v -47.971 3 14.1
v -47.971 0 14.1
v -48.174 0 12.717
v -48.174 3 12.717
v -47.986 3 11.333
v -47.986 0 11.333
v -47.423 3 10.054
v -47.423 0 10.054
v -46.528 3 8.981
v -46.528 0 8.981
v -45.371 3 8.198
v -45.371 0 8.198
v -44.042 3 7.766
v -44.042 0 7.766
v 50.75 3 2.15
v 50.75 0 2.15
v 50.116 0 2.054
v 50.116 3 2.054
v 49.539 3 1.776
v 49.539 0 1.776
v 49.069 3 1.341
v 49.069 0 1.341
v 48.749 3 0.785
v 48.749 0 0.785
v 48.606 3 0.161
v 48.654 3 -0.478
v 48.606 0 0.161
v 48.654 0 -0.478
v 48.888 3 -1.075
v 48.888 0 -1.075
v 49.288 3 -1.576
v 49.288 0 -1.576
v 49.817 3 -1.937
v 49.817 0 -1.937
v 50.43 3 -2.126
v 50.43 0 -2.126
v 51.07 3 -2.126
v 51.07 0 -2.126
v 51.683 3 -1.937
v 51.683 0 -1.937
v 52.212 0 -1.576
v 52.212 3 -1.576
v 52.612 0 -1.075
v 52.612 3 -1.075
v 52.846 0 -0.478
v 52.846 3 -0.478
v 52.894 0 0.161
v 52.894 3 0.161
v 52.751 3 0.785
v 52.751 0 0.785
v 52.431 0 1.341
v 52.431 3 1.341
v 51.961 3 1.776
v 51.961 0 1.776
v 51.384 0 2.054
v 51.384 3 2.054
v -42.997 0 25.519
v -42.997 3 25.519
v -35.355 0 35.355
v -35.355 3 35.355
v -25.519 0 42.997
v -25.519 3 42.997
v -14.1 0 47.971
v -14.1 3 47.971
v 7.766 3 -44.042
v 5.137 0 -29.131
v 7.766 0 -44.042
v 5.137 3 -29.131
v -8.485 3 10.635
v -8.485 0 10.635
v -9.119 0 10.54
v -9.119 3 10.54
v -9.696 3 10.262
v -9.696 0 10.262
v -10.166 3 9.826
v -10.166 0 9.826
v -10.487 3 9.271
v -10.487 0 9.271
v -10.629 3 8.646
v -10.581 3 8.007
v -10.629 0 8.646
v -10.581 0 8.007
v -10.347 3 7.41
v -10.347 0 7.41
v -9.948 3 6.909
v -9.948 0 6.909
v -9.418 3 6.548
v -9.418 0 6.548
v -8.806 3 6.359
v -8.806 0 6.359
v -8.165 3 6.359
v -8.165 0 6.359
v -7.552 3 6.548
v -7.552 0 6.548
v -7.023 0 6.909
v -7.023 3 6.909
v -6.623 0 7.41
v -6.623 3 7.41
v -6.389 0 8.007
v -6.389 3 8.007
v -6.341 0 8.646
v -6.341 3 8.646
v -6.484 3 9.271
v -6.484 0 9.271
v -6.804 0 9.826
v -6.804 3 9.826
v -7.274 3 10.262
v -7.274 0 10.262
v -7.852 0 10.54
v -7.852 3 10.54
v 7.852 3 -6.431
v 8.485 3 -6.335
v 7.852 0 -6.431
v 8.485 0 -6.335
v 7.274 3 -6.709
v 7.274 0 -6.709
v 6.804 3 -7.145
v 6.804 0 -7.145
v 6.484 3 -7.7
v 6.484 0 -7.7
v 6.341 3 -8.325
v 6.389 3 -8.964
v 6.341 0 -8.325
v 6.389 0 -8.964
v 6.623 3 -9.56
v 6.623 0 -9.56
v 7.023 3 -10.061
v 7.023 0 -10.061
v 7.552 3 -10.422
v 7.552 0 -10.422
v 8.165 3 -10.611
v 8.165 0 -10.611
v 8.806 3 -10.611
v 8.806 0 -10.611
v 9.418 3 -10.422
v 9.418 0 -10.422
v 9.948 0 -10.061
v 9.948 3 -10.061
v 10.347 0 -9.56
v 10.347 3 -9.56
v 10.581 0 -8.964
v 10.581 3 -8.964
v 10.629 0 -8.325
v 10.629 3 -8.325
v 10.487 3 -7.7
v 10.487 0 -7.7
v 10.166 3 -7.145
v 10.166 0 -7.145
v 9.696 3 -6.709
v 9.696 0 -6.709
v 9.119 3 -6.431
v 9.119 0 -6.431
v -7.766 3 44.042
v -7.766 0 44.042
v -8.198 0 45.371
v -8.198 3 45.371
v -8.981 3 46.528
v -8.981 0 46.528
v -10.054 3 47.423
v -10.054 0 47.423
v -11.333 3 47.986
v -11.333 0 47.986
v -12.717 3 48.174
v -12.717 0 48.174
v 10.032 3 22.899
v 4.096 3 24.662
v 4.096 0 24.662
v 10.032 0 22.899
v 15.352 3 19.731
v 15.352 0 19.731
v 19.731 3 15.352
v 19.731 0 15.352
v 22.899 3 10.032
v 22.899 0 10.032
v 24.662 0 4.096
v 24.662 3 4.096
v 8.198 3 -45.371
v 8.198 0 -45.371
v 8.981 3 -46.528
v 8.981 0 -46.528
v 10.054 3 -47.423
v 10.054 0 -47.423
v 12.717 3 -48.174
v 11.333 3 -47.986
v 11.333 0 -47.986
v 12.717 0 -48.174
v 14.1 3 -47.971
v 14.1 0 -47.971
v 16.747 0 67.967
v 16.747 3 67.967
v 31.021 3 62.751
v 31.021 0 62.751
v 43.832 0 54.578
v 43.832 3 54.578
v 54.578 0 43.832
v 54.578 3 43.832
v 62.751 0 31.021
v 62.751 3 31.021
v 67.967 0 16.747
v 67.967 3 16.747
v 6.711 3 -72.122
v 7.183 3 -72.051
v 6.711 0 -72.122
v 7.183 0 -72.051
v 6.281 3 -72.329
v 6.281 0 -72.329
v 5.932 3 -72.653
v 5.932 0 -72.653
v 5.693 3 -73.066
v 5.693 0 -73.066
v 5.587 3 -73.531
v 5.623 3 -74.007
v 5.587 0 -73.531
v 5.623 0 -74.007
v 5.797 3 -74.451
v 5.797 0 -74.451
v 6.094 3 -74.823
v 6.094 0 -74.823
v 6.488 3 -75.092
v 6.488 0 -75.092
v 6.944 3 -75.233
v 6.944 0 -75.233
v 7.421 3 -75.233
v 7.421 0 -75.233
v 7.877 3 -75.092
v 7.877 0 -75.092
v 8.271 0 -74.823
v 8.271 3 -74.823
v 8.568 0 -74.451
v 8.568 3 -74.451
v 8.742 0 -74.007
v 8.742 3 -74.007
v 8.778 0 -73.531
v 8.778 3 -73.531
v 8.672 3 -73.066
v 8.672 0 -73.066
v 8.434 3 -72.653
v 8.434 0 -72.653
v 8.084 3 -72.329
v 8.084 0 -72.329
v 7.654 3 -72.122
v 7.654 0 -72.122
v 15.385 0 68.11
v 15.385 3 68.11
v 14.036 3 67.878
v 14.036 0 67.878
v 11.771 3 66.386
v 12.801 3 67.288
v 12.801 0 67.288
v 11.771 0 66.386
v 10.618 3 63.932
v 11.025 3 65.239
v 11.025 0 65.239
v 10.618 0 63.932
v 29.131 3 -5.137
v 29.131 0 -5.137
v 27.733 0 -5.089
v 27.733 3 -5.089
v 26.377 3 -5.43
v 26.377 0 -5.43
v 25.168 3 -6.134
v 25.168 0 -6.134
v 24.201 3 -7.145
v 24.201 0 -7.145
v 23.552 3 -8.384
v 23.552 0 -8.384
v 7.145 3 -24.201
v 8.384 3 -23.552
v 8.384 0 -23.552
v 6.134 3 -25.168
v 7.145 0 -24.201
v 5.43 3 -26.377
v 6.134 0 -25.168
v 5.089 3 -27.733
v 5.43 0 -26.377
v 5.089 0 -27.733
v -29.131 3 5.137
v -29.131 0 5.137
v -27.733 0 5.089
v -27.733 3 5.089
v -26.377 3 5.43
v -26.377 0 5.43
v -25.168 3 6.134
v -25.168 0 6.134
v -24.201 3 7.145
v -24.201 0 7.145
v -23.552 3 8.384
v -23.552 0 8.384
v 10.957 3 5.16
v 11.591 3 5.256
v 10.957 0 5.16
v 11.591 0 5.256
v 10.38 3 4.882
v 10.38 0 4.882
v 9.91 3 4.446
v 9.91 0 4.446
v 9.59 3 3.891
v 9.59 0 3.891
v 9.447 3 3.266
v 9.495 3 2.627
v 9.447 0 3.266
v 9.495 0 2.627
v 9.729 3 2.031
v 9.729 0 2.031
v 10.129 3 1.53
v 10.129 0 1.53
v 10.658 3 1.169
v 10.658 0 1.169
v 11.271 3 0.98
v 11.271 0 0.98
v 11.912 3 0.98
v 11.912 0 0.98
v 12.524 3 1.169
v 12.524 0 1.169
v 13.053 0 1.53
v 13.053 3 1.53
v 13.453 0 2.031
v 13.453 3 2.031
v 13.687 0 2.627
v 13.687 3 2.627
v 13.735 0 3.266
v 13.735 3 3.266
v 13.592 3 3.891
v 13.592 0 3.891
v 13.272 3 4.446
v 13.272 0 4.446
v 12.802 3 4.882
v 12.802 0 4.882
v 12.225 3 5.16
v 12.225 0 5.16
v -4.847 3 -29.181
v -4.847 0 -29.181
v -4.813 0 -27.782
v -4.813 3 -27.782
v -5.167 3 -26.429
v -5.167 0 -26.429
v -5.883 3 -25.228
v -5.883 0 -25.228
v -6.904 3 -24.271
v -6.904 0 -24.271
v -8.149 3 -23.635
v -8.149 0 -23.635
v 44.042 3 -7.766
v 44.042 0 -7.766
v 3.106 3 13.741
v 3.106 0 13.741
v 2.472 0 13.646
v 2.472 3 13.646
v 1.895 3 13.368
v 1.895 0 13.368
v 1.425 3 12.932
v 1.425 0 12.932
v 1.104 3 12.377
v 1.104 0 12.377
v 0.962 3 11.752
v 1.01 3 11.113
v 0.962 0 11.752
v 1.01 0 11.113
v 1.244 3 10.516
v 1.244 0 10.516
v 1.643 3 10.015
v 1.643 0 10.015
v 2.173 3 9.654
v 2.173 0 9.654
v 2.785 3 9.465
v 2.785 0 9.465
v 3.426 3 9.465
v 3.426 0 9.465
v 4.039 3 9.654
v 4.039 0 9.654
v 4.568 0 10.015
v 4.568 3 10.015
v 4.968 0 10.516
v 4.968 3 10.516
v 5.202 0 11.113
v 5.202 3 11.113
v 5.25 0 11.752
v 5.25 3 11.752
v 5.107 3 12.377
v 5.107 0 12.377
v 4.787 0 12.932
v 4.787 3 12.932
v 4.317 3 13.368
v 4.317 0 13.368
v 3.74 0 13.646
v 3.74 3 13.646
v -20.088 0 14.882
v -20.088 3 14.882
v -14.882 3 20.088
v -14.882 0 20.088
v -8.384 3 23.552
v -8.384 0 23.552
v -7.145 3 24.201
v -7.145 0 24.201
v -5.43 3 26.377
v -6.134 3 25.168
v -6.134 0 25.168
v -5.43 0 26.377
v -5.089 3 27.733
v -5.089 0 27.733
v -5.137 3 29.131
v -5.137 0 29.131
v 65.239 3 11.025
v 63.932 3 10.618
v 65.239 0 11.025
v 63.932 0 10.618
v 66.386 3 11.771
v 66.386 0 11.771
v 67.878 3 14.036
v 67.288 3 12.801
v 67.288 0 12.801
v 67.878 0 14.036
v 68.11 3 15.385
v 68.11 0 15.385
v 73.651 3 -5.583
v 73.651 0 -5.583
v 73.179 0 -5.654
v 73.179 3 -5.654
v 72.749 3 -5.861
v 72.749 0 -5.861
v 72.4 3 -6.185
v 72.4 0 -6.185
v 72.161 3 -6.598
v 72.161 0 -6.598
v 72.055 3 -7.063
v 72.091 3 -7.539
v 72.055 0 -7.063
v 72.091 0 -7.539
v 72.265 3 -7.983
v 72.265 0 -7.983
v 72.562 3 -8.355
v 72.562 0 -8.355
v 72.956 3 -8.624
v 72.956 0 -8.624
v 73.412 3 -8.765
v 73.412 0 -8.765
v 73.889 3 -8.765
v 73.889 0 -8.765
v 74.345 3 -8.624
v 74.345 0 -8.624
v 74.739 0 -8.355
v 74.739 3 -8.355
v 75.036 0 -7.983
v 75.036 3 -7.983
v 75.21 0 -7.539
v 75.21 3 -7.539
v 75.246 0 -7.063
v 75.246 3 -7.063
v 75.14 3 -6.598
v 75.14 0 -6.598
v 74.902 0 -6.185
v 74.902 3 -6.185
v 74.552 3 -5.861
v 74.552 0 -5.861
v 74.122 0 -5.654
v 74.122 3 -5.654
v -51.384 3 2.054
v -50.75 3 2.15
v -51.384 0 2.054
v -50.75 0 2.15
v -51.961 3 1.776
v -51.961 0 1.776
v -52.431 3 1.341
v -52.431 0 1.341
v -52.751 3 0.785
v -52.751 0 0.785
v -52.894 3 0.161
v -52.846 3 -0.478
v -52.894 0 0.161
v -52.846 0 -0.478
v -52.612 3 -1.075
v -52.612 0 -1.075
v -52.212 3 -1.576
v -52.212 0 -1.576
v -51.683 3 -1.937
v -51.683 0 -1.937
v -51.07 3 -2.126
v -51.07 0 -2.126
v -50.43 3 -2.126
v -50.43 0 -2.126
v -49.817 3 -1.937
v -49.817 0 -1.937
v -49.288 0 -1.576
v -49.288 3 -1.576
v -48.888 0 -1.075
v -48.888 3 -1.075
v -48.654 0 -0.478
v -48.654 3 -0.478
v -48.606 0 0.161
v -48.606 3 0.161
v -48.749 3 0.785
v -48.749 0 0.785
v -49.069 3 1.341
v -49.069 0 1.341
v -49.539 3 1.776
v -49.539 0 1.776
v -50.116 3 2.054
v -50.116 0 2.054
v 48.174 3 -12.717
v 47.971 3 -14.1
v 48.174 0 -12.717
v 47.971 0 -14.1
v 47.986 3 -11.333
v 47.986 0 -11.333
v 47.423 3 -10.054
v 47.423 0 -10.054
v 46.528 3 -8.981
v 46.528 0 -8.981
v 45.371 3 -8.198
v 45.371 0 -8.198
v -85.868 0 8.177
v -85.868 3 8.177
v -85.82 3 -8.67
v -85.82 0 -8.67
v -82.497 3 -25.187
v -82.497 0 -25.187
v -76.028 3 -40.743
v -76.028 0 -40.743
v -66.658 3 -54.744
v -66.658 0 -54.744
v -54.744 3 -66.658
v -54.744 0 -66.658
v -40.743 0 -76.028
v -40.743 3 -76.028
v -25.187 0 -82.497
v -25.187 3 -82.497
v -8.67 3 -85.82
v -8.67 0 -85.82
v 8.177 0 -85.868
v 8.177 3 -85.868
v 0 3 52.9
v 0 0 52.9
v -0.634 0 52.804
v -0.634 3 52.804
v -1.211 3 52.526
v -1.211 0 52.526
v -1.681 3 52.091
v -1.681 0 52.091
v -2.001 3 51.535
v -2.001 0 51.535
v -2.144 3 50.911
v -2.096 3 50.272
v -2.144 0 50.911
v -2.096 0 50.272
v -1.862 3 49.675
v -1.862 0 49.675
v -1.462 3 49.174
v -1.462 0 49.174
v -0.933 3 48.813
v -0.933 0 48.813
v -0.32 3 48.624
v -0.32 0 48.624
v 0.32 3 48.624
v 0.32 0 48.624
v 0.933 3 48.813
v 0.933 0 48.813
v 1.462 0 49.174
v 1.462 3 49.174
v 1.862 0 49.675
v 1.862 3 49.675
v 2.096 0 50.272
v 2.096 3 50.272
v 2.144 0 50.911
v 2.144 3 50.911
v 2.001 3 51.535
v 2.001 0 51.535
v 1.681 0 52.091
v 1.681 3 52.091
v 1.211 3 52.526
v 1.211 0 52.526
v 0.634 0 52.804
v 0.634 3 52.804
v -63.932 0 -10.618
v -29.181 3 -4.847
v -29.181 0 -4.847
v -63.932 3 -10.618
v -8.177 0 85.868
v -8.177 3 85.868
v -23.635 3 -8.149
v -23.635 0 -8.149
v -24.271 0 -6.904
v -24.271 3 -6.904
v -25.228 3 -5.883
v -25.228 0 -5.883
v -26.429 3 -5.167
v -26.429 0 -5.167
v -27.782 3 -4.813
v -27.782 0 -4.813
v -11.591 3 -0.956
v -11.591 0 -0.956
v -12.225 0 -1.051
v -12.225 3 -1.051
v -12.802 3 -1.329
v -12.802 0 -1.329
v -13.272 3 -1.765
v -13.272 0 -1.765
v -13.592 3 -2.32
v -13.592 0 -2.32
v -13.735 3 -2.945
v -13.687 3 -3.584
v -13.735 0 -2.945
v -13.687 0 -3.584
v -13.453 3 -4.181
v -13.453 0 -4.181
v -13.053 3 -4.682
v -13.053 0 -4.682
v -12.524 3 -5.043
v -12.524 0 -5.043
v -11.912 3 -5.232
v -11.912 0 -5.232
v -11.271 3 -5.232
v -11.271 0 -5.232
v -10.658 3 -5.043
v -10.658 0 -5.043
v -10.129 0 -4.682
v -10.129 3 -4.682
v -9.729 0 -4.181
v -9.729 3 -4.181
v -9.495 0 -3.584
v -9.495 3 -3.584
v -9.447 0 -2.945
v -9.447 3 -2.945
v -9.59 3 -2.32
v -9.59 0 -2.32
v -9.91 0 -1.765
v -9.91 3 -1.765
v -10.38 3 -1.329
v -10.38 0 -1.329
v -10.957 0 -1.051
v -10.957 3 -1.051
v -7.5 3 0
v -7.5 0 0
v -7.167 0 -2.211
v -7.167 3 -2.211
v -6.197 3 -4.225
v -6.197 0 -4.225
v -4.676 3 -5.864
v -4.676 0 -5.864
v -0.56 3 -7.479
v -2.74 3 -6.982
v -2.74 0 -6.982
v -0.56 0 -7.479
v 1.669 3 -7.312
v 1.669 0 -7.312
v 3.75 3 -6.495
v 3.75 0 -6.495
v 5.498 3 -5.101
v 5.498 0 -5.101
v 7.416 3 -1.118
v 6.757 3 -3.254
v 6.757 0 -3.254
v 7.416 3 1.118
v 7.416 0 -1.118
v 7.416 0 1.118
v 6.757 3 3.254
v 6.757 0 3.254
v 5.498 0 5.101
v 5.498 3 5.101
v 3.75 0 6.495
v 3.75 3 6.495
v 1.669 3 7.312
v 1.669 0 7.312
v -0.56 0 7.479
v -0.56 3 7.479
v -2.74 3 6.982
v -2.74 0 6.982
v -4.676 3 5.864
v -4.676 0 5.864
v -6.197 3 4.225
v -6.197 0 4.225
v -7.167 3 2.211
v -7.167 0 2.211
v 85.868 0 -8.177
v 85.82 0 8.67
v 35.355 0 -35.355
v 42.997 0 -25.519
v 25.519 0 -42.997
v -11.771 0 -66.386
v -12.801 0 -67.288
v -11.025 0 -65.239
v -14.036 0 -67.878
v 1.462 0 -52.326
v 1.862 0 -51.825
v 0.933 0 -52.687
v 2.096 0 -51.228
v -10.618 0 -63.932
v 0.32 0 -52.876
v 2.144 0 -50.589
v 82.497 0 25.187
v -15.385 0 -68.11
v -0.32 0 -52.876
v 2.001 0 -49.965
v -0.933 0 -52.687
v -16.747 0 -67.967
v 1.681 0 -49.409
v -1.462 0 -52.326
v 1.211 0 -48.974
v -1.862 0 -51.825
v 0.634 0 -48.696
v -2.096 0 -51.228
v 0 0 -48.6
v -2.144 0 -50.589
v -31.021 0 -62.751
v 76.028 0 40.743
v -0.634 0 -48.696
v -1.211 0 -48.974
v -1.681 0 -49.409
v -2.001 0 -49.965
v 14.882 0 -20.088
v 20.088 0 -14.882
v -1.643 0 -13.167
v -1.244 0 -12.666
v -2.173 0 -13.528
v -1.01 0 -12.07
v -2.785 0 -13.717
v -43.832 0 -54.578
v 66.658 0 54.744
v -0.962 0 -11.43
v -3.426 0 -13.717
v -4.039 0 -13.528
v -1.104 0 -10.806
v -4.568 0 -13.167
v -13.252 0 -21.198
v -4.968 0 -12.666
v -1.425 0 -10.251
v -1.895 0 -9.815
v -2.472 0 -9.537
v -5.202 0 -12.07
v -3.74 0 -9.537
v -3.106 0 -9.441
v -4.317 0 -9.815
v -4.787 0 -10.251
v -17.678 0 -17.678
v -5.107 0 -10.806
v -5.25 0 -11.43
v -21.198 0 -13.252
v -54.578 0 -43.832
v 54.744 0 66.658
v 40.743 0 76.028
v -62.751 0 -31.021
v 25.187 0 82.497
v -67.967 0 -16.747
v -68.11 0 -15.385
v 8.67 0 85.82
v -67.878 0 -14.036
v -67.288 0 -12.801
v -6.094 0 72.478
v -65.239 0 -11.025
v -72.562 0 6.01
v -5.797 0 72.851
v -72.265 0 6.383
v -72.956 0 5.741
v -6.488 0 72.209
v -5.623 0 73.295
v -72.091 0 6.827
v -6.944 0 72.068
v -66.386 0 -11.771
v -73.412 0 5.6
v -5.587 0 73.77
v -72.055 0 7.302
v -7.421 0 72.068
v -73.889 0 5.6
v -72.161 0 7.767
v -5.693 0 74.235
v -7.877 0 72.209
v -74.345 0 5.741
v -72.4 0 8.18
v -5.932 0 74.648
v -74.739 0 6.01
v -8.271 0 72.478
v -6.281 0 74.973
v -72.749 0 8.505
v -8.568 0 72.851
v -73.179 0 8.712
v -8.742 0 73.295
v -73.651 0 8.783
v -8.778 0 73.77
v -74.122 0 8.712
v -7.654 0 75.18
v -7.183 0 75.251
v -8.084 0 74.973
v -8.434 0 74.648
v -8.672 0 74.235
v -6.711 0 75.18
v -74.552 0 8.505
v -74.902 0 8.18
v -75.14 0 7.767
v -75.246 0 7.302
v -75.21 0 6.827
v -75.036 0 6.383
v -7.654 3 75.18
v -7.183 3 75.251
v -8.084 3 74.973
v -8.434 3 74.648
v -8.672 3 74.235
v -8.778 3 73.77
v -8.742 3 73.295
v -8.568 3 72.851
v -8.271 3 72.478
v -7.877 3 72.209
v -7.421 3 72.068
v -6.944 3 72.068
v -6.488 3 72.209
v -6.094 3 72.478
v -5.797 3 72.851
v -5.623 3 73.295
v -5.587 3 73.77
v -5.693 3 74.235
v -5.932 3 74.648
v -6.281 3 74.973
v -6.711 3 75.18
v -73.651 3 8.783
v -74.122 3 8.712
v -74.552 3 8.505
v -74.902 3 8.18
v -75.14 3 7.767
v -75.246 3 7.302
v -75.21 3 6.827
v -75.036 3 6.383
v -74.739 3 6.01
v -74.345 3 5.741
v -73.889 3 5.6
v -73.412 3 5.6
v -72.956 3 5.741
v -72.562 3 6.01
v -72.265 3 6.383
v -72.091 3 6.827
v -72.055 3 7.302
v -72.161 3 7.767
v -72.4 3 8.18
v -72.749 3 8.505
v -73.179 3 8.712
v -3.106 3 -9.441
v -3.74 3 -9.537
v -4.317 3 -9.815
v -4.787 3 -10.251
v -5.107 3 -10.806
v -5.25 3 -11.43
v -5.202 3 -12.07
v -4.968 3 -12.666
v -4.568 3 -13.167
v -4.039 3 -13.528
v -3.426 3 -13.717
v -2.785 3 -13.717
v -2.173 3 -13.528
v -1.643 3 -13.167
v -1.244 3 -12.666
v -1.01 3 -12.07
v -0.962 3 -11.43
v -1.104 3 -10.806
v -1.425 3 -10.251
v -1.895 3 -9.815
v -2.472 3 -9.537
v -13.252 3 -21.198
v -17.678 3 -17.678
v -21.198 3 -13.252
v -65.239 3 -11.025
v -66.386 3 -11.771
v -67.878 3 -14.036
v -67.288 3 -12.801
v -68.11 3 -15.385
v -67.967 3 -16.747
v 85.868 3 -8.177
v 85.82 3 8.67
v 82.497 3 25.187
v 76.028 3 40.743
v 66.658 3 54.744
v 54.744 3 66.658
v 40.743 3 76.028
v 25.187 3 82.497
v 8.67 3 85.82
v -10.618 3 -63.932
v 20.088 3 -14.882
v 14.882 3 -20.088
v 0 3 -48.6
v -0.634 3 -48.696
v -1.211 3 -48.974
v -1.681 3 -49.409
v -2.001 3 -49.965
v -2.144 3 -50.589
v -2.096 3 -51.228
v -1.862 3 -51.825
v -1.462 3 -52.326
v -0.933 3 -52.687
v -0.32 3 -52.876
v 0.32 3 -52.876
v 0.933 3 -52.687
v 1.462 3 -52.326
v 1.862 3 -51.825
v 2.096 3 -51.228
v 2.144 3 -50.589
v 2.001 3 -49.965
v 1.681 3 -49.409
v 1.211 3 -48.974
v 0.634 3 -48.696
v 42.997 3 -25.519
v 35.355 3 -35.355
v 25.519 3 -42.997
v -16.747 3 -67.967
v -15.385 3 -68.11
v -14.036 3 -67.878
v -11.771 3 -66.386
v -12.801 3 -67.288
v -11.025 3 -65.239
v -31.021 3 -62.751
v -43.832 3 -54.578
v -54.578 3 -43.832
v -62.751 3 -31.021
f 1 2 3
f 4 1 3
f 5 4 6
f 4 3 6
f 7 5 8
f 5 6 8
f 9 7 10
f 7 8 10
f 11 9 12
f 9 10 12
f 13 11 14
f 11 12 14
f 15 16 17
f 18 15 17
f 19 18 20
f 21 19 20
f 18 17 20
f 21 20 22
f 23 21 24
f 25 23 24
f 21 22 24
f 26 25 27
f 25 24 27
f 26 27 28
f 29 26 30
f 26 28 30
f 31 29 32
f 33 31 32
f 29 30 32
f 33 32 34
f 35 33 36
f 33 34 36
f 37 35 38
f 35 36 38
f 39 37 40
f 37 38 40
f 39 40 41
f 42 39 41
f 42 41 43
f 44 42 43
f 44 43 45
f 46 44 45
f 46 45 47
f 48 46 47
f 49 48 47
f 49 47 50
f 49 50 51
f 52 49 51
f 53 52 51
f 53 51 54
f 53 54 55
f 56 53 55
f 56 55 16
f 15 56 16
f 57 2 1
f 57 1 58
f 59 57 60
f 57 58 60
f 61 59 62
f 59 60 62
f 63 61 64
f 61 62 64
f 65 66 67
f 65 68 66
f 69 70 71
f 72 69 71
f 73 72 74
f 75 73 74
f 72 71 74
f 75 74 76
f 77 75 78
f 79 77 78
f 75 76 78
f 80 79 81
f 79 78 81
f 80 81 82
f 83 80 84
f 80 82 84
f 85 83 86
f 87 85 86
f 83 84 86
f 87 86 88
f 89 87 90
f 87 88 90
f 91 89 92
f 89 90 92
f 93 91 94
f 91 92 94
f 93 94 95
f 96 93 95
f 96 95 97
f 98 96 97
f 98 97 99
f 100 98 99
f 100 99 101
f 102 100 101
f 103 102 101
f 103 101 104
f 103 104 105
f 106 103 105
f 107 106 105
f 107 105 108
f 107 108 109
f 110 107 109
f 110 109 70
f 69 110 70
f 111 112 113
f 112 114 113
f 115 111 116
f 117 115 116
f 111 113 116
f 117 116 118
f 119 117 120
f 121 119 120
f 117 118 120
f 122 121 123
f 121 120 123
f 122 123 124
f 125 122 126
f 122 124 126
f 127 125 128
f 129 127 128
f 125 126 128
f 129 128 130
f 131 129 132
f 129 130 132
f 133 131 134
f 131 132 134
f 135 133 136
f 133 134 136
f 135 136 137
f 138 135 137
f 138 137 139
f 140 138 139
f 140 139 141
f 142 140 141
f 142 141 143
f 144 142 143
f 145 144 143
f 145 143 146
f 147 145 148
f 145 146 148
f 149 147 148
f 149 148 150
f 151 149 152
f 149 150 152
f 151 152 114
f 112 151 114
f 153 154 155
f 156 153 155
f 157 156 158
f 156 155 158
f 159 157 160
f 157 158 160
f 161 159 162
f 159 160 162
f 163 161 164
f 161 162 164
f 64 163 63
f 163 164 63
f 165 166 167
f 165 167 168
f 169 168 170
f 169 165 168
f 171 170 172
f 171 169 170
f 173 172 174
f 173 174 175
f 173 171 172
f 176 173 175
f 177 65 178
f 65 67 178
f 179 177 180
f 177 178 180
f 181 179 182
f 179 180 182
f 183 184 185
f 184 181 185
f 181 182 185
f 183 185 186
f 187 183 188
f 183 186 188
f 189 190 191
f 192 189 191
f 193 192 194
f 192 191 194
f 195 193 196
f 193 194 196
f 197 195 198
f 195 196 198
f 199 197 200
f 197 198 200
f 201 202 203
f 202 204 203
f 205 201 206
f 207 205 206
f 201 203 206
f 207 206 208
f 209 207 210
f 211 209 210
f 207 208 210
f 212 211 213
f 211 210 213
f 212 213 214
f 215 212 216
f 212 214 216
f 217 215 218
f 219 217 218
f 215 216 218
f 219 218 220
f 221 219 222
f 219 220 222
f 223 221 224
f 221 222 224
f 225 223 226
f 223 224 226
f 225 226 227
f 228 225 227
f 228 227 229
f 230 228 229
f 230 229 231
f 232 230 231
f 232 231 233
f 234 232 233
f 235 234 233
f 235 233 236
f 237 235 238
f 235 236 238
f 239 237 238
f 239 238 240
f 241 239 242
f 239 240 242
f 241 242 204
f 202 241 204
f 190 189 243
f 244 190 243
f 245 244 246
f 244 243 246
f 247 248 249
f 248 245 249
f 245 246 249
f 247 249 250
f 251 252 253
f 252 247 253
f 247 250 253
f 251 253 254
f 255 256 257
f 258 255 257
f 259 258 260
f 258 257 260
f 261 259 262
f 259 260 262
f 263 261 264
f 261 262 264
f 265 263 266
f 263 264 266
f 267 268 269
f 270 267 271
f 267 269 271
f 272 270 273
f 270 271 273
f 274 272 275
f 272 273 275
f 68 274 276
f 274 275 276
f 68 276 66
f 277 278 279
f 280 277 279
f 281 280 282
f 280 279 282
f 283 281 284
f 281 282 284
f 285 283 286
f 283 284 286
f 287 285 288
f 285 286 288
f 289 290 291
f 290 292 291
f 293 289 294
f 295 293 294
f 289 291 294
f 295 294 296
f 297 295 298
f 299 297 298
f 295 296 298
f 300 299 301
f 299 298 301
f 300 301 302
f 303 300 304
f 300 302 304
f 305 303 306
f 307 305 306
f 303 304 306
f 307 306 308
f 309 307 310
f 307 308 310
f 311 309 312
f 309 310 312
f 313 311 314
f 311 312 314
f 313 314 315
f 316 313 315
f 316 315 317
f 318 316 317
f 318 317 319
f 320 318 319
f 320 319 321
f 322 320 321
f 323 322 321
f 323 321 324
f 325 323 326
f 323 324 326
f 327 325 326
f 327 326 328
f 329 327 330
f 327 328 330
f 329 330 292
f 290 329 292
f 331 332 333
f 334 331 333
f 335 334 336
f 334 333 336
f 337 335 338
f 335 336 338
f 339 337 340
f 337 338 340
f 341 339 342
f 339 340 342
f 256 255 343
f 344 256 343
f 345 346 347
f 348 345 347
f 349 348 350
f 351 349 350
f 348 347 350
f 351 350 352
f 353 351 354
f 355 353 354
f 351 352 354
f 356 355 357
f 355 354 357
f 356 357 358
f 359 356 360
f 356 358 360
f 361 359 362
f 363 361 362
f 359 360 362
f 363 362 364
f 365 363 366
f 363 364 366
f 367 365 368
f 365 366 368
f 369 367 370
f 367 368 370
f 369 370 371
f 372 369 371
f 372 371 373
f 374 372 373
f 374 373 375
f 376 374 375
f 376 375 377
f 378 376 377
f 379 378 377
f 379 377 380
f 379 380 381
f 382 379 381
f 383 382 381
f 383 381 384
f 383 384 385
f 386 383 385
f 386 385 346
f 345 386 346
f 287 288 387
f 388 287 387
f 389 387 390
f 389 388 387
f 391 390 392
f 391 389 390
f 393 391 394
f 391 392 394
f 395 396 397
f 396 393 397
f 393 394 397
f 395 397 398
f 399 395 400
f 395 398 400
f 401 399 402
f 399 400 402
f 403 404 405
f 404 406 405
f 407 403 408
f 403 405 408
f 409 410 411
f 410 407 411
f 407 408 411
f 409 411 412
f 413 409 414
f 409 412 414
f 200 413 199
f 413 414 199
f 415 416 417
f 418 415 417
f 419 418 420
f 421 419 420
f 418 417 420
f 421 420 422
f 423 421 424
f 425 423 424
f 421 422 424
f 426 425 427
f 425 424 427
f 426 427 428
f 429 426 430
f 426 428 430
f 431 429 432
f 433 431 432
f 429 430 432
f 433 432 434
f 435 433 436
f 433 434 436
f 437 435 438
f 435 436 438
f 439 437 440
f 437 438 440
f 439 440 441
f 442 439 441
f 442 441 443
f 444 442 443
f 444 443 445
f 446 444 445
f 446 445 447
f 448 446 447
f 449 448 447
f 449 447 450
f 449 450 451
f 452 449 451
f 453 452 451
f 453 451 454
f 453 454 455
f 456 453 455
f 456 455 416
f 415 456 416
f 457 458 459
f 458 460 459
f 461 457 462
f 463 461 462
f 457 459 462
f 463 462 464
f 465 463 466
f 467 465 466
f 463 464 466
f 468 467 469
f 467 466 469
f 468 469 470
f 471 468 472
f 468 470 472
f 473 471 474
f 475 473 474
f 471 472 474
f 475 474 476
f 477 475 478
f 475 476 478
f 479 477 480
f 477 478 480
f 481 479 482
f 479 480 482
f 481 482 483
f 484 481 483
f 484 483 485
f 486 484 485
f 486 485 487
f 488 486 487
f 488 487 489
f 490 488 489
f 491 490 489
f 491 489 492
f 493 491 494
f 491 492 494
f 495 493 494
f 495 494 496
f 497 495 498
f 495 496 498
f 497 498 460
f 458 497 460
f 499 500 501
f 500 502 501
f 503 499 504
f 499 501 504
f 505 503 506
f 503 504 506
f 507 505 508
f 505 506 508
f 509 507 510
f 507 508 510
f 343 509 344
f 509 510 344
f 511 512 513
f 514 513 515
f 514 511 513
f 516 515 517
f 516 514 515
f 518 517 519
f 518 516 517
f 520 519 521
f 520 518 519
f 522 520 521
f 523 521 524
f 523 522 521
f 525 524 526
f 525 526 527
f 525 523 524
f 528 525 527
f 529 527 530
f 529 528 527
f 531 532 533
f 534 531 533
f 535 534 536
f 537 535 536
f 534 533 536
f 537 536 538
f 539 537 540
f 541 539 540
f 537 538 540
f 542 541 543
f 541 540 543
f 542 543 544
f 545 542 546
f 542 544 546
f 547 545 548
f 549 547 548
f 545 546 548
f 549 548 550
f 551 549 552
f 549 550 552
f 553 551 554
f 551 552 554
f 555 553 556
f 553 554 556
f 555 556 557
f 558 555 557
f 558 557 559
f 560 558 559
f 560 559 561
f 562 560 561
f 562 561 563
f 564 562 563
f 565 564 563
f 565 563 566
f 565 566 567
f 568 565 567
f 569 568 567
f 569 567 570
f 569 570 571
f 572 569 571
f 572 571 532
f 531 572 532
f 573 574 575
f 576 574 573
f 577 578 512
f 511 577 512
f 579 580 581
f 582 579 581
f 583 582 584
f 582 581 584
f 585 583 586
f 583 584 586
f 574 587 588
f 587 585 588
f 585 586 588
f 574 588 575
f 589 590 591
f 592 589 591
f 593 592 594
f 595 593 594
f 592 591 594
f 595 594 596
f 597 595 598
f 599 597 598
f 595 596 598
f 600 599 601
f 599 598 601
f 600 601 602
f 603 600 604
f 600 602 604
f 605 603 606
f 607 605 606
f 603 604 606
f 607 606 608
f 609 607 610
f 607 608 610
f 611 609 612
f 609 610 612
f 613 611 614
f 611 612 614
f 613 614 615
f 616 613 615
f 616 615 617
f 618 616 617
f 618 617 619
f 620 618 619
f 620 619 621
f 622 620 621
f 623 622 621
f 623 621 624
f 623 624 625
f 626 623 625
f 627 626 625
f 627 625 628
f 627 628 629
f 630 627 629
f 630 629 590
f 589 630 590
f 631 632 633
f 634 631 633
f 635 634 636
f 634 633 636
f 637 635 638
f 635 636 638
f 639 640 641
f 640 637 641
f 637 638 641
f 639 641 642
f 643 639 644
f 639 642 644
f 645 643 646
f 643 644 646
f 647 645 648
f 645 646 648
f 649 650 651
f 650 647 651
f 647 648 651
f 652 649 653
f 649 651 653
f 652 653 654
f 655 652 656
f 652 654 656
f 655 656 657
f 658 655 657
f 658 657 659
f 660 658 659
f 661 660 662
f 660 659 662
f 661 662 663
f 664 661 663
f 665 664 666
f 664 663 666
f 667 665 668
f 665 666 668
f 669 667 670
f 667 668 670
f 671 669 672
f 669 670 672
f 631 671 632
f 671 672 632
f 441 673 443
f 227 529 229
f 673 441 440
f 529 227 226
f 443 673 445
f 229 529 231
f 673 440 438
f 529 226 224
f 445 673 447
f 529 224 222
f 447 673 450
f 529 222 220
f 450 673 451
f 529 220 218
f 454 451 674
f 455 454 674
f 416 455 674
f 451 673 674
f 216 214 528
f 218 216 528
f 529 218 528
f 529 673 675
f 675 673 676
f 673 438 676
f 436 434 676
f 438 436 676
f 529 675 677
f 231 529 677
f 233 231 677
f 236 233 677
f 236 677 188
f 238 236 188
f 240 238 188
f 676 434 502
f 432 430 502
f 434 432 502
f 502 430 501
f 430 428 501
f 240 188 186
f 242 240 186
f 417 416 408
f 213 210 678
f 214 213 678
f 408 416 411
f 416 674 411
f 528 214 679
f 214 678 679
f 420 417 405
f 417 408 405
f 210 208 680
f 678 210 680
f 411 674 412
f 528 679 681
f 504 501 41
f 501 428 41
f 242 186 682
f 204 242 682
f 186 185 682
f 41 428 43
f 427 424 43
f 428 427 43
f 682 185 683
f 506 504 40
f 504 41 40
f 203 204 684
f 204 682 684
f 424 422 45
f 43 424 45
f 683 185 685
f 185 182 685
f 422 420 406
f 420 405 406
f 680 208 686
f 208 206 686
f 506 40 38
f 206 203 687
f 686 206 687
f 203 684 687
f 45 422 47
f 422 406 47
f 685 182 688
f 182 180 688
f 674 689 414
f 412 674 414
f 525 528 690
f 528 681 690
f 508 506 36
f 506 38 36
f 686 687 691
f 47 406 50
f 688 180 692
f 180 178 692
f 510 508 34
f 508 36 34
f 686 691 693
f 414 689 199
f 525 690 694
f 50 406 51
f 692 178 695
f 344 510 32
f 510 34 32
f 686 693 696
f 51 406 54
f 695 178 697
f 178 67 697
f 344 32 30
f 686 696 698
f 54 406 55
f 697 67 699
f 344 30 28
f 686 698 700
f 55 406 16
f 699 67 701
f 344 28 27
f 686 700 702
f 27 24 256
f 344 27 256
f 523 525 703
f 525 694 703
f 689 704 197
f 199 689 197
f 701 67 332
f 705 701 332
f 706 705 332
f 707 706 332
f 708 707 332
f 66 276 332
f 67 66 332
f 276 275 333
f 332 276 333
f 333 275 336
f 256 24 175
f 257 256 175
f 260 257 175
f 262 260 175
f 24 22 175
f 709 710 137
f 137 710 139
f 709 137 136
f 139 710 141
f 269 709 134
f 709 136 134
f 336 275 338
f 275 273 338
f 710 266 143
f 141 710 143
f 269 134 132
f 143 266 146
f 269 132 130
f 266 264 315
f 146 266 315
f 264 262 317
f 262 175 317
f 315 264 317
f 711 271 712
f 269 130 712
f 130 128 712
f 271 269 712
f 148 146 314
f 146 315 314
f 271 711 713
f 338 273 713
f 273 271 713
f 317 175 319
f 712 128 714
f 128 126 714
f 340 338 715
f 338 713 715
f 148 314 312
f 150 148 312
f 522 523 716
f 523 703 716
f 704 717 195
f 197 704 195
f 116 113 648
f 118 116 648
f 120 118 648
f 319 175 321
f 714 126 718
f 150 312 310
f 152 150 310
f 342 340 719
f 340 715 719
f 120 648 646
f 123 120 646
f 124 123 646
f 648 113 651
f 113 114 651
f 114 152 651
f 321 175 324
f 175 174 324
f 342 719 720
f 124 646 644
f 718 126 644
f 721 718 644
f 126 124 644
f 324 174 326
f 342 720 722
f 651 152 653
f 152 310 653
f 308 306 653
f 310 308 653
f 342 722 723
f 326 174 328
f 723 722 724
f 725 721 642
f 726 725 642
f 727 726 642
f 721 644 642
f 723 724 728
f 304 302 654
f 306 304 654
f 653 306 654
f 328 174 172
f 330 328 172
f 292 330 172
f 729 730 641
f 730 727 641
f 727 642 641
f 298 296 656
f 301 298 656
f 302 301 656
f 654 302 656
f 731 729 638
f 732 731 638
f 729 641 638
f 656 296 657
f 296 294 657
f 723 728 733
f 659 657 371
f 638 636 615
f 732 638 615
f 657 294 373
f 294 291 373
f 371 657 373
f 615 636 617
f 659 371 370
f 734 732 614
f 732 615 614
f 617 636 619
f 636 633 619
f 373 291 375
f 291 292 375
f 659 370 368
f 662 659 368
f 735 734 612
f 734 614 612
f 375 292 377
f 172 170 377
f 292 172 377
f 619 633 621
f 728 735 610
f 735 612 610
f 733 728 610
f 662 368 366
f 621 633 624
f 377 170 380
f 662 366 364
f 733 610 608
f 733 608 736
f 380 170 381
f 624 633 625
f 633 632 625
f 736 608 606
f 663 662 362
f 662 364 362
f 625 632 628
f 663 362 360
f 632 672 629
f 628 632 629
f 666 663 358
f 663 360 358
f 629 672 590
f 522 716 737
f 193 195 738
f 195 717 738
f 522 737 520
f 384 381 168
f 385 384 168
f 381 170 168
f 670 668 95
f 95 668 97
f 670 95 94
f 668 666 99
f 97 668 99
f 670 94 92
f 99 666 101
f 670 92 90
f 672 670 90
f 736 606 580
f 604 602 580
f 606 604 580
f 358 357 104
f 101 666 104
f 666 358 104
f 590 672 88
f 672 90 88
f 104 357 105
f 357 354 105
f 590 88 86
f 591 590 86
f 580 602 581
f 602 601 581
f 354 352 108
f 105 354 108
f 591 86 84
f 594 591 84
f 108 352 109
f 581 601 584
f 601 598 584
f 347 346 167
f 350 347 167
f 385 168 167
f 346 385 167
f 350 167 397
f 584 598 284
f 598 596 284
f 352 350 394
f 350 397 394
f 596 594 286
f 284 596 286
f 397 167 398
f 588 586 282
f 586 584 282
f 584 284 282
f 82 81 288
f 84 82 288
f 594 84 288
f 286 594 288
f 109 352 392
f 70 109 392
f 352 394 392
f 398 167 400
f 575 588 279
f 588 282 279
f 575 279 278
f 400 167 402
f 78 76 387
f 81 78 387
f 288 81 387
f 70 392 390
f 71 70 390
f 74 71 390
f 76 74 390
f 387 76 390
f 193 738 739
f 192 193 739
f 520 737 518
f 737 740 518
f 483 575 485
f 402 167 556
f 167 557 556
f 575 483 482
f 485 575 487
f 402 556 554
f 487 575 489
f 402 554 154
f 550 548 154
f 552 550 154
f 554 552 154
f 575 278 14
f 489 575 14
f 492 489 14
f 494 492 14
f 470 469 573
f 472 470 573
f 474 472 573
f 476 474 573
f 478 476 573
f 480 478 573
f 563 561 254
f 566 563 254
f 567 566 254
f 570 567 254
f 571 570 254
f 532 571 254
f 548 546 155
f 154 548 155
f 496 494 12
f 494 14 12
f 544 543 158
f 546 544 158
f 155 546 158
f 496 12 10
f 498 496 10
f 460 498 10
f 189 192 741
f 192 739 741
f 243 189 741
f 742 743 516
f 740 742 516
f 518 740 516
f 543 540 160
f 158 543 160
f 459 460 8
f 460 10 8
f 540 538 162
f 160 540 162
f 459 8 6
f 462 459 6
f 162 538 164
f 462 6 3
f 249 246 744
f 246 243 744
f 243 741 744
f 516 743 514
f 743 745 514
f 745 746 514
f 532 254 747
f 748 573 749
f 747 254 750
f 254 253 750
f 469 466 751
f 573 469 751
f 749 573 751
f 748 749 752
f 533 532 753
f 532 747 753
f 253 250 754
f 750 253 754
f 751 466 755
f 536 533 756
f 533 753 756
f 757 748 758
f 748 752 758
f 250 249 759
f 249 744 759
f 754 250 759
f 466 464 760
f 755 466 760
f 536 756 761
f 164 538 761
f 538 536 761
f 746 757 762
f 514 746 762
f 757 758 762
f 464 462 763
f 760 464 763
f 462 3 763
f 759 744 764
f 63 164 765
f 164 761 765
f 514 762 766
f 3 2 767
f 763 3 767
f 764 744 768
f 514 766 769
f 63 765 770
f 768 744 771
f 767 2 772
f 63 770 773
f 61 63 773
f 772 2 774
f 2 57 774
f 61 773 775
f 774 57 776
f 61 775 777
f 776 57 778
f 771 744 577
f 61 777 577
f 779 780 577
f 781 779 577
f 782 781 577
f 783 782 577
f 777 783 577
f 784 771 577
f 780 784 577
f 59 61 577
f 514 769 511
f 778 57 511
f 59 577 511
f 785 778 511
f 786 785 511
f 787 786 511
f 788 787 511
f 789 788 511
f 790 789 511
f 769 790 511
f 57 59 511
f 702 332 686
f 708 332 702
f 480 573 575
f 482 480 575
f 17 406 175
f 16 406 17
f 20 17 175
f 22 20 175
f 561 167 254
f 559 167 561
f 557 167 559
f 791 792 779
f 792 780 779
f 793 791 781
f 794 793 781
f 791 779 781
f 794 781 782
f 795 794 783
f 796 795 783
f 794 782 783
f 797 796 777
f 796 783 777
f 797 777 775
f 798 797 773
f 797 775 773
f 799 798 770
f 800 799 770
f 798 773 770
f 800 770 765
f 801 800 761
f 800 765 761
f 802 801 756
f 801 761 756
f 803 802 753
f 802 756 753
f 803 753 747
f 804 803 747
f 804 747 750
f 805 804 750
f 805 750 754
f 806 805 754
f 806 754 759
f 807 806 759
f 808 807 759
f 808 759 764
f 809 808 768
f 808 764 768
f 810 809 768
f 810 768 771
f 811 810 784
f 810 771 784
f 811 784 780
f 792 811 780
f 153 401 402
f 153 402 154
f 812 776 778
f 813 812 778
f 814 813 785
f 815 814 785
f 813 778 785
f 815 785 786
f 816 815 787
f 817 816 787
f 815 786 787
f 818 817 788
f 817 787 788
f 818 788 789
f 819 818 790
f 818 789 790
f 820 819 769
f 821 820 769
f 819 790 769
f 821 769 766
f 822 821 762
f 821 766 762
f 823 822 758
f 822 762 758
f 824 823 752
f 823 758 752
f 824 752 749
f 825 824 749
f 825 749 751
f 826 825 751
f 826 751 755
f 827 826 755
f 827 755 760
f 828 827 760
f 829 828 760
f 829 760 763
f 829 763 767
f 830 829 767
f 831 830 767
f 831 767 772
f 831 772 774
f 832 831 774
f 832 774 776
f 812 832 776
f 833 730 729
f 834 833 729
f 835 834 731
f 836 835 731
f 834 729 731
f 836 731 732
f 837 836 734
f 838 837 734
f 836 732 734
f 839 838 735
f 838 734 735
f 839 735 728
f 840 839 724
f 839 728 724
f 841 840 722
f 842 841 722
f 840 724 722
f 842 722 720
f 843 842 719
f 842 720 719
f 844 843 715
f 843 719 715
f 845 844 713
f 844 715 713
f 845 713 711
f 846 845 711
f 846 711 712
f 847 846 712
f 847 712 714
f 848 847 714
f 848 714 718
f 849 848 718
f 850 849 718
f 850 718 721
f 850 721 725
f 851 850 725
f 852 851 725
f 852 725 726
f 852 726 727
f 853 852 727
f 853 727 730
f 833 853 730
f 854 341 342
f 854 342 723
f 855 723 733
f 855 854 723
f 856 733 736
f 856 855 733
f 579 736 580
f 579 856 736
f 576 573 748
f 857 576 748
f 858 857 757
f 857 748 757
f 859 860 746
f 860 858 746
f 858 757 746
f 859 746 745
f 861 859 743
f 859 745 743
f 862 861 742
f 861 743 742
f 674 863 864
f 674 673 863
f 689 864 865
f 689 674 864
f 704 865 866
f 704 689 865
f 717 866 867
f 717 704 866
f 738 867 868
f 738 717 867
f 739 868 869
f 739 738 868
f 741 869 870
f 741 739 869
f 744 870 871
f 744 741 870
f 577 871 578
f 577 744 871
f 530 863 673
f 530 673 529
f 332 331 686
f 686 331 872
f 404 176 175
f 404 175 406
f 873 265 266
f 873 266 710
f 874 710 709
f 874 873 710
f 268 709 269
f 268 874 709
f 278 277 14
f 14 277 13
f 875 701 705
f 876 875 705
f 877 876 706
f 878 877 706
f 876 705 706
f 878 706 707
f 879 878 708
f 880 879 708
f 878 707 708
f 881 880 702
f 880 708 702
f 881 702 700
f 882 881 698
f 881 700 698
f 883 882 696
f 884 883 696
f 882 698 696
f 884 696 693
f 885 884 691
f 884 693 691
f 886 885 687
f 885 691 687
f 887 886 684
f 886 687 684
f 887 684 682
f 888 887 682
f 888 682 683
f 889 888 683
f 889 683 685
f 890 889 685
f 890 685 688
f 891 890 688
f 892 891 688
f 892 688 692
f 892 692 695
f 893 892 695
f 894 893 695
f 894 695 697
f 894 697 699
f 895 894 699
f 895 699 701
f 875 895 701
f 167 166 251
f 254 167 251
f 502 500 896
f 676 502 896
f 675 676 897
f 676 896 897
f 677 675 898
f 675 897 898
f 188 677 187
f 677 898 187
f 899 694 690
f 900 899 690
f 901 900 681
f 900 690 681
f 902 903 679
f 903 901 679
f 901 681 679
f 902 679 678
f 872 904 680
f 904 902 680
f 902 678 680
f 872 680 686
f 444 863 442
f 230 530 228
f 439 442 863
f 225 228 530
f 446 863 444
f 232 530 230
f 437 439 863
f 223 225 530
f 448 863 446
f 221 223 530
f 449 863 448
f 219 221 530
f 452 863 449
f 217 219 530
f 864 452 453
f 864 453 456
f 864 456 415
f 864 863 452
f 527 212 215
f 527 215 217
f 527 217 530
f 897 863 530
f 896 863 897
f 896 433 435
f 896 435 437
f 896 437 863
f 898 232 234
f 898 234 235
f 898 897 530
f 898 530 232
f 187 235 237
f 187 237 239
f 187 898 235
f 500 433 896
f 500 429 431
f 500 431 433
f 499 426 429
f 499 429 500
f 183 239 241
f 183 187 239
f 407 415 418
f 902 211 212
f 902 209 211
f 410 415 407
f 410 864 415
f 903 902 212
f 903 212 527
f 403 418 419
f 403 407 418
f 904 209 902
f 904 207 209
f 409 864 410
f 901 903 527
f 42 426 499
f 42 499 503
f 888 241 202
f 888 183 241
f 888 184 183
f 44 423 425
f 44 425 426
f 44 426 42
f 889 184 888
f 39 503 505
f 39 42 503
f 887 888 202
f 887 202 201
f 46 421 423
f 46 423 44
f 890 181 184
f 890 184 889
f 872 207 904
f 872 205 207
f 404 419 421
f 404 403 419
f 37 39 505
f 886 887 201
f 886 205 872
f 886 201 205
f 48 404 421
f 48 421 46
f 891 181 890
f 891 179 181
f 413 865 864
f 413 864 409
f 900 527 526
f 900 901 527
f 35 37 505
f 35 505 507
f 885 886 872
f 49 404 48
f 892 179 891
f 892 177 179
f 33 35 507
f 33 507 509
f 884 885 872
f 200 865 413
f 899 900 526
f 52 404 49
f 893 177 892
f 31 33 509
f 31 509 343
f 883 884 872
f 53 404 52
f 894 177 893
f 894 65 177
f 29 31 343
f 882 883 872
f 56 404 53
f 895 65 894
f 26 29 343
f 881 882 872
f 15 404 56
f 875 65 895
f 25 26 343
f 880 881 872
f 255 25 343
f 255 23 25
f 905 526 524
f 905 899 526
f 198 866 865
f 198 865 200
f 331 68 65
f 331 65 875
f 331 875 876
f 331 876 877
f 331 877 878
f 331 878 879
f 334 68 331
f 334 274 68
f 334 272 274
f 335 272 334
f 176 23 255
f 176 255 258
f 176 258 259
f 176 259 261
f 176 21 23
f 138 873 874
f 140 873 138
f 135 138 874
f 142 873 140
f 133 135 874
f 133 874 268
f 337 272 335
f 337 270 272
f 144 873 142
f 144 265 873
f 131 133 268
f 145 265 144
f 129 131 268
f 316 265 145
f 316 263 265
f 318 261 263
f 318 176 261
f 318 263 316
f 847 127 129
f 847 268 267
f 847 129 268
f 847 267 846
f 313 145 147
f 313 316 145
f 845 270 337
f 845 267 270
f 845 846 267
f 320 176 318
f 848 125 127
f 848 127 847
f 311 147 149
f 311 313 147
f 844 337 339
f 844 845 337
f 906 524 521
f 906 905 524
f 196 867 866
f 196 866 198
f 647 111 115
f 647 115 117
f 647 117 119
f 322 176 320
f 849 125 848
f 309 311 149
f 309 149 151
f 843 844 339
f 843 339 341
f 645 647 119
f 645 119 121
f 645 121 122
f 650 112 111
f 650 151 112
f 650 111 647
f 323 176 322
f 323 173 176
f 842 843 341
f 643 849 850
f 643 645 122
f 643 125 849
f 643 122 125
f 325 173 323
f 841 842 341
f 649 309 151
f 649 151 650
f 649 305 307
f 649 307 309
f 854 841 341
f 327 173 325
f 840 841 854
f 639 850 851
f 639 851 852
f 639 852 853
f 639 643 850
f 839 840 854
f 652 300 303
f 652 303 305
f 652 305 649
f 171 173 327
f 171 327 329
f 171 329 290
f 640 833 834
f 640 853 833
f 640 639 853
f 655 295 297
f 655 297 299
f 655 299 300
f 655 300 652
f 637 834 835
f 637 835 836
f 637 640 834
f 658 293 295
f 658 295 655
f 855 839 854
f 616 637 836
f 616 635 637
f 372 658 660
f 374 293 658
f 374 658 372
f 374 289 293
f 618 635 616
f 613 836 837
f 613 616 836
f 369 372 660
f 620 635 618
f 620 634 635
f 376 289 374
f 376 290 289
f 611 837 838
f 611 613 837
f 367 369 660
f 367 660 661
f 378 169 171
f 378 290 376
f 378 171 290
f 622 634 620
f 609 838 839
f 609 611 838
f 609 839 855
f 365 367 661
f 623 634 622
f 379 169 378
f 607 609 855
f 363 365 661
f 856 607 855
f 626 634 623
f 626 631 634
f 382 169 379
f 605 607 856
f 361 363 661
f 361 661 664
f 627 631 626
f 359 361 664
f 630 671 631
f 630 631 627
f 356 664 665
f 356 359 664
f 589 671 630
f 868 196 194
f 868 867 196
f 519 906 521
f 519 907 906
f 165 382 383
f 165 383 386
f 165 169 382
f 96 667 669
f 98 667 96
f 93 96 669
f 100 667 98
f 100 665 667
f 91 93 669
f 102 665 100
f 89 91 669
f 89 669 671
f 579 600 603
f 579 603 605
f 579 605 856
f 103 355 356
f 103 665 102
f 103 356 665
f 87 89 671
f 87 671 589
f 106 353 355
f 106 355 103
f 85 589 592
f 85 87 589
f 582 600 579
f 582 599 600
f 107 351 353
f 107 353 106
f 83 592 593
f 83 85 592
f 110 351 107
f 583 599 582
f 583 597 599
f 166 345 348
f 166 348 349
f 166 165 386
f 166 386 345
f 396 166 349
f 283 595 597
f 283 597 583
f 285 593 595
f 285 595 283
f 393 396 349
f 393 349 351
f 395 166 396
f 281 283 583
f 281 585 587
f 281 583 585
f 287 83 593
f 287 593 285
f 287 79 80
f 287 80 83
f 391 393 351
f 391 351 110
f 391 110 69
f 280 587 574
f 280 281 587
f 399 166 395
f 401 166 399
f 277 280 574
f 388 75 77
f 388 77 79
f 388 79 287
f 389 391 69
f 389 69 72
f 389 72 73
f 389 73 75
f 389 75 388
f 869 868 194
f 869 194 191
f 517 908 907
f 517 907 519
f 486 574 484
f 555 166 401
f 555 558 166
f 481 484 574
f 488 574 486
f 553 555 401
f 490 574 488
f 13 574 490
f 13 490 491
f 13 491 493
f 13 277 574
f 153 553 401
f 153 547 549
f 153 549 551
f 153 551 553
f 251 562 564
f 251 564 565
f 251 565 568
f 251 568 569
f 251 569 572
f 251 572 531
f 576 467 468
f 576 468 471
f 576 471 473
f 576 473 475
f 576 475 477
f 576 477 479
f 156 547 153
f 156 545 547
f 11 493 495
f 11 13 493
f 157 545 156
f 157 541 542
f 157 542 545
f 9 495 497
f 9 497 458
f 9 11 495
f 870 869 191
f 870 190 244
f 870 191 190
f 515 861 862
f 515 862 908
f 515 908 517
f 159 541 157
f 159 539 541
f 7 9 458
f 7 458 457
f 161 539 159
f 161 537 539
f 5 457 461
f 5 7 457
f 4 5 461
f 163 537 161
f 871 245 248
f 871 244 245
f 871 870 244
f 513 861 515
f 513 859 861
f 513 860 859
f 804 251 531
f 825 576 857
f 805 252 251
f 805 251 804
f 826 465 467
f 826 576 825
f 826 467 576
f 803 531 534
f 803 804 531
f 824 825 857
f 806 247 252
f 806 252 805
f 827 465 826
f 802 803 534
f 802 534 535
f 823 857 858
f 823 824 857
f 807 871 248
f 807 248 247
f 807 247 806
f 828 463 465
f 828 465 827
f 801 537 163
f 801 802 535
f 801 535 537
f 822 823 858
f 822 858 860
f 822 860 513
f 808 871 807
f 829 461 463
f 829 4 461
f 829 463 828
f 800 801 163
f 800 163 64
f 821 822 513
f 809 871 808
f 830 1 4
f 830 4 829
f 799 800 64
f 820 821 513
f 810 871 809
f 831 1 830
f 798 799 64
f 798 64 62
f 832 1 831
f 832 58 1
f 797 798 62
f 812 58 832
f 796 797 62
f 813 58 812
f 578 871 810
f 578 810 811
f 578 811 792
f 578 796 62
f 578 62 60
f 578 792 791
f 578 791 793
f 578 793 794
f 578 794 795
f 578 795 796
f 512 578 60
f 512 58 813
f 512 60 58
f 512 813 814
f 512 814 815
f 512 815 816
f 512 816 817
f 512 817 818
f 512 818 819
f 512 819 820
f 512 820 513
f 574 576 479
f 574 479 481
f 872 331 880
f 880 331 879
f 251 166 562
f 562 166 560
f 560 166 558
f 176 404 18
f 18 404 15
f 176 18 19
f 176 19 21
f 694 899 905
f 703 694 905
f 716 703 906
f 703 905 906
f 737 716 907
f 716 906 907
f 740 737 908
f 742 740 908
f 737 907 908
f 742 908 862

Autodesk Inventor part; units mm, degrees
ref_plane "YZ Plane" through (0, 0, 0) normal (1, 0, 0) x (0, 1, 0)
ref_plane "XZ Plane" through (0, 0, 0) normal (0, 1, 0) x (-1, 0, 0)
ref_plane "XY Plane" through (0, 0, 0) normal (0, 0, 1) x (1, 0, 0)
sketch "スケッチ1" plane through (0, 0, 0) normal (0, 1, 0) x (-1, 0, 0)
  circle A0 centre (0, 0) radius 86.2565
  circle A1 centre (0, 0) radius 7.5
  dimension "d0" = 172.513
  dimension "d1" = 15
extrude "押し出し1" add sketch "スケッチ1" along normal blind 3
sketch "スケッチ2" plane through (0, 3, 0) normal (0, 1, 0) x (1, 0, 0)
  circle A0 centre (0, 0) radius 50.75
  point P0 (0, 50.75)
  point P1 (-50.75, 0)
  point P2 (0, -50.75)
  point P3 (50.75, 0)
  dimension "d4" = 101.5
  dimension "d7" = 360
hole "穴1" at (0, 3, -50.75) at (-50.75, 3, 0) at (0, 3, 50.75) at (50.75, 3, 0) direction (0, -1, 0) diameter 4.3 end through all
sketch "スケッチ3" plane through (0, 3, 0) normal (0, 1, 0) x (1, 0, 0)
  line L0 (0, 0) -> (86.2565, 0)
  circle A0 centre (0, 0) radius 86.2565 projected
  circle A1 centre (0, 0) radius 7.5 projected
  line L1 (0, 0) -> (60.9926, -60.9926)
  line L2 (-8.1772, -85.868) -> (-85.868, -8.1772)
  line L3 (85.868, 8.1772) -> (8.1772, 85.868)
  point P0 (8.1772, 85.868)
  point P1 (83.085, 0)
  point P2 (85.868, 8.1772)
  dimension "d16" = 45
  dimension "d64" = 66.5
extrude "押し出し2" cut sketch "スケッチ3" against normal blind 3 contours L3 A0 | A0 L2
sketch "スケッチ4" plane through (0, 3, 0) normal (0, 1, 0) x (1, 0, 0)
  circle A0 centre (0, 0) radius 7.5 projected
  circle A1 centre (0, 0) radius 12
  line L0 (0, 0) -> (-8.4853, -8.4853)
  line L1 (0, 0) -> (-12, 0)
  point P0 (3.1058, -11.5911)
  point P1 (11.5911, -3.1058)
  point P2 (8.4853, 8.4853)
  point P3 (-3.1058, 11.5911)
  point P4 (-11.5911, 3.1058)
  dimension "d20" = 24
  dimension "d21" = 45
  dimension "d24" = 360
hole "穴2" at (-8.4853, 3, 8.4853) at (3.1058, 3, 11.5911) at (11.5911, 3, 3.1058) at (8.4853, 3, -8.4853) at (-3.1058, 3, -11.5911) at (-11.5911, 3, -3.1058) direction (0, -1, 0) diameter 4.3 end through all
sketch "スケッチ5" plane through (0, 3, 0) normal (0, 1, 0) x (1, 0, 0)
  arc A0 (-8.1772, -85.868) -> (85.868, 8.1772) centre (0, 0) ccw projected
  line L0 (5.2626, -86.0958) -> (-86.0958, 5.2626)
  arc A1 (8.1772, 85.868) -> (-85.868, -8.1772) centre (0, 0) ccw projected
  line L1 (-85.868, -8.1772) -> (-8.1772, -85.868) projected
  line L2 (-5.2626, 86.0958) -> (86.0958, -5.2626)
  line L3 (85.868, 8.1772) -> (8.1772, 85.868) projected
  line L4 (-85.868, -8.1772) -> (8.1772, 85.868)
  line L5 (-8.1772, -85.868) -> (85.868, 8.1772)
  line L6 (-73.6506, -7.1826) -> (7.1826, 73.6506)
  line L7 (80.2566, 13.7886) -> (-7.1826, -73.6506)
  line L8 (0, 0) -> (40.4166, 40.4166)
  circle A2 centre (0, 0) radius 74
  point P0 (-73.6506, -7.1826)
  point P1 (7.1826, 73.6506)
  point P2 (73.6506, 7.1826)
  dimension "d61" = 148
  dimension "d62" = 47
  dimension "d63" = 47
hole "穴3" at (-73.6506, 3, 7.1826) at (7.1826, 3, -73.6506) at (73.6506, 3, -7.1826) at (-7.1826, 3, 73.6506) direction (0, -1, 0) diameter 3.2 end through all
sketch "スケッチ6" plane through (0, 3, 0) normal (0, 1, 0) x (1, 0, 0)
  circle A0 centre (0, 0) radius 7.5 projected
  circle A1 centre (0, 0) radius 70
  circle A2 centre (0, 0) radius 50
  circle A3 centre (7.1826, 73.6506) radius 1.6 projected
  line L0 (0, 0) -> (7.1826, 73.6506)
  circle A4 centre (-73.6506, -7.1826) radius 1.6 projected
  line L1 (0, 0) -> (-73.6506, -7.1826)
  line L2 (0, 0) -> (-11.469, 69.0541)
  line L3 (0, 0) -> (-69.0541, 11.469)
  circle A5 centre (0, 0) radius 25
  circle A6 centre (0, 50.75) radius 2.15 projected
  line L4 (0, 0) -> (0, 50.75)
  line L5 (0, 0) -> (8.6824, 49.2404)
  line L6 (0, 0) -> (49.2404, 8.6824)
  circle A7 centre (50.75, 0) radius 2.15 projected
  line L7 (0, 0) -> (50.75, 0)
  line L8 (0, 0) -> (-49.2404, -8.6824)
  line L9 (0, 0) -> (-8.6824, -49.2404)
  line L10 (0, 0) -> (11.469, -69.0541)
  line L11 (0, 0) -> (69.0541, -11.469)
  circle A8 centre (0, 0) radius 40
  point P0 (-4.3412, -24.6202)
  point P1 (-24.6202, -4.3412)
  point P2 (49.3243, -8.1921)
  point P3 (24.6622, -4.0961)
  point P4 (4.0961, -24.6622)
  point P5 (8.1921, -49.3243)
  point P6 (24.6202, 4.3412)
  point P7 (4.3412, 24.6202)
  point P8 (-24.6622, 4.0961)
  point P9 (-4.0961, 24.6622)
  point P10 (-8.1921, 49.3243)
  point P11 (-49.3243, 8.1921)
  point P12 (69.0541, -11.469)
  point P13 (11.469, -69.0541)
  point P14 (39.4595, -6.5537)
  point P15 (6.5537, -39.4595)
  point P16 (-39.4595, 6.5537)
  point P17 (-6.5537, 39.4595)
  dimension "d44" = 140
  dimension "d45" = 100
  dimension "d46" = 15
  dimension "d47" = 15
  dimension "d48" = 50
  dimension "d49" = 10
  dimension "d50" = 10
  dimension "d53" = 360
  dimension "d57" = 80
extrude "押し出し3" cut sketch "スケッチ6" against normal blind 10 contours A5 L5 A8 L6 | L11 A8 L10 A5 | A8 L5 A2 L6 | L11 A2 L10 A8 | A5 L3 A8 L2 | A5 L9 A8 L8 | L11 A1 L10 A2 | A8 L3 A2 L2 | A8 L9 A2 L8 | A2 L3 A1 L2
fillet "フィレット1" radius 5 14 edges at (-11.469, 1.5, -69.0541) (-69.0541, 1.5, -11.469) (-49.2404, 1.5, 8.6824) (-24.6202, 1.5, 4.3412) (-8.6824, 1.5, 49.2404) (-4.3412, 1.5, 24.6202) (11.469, 1.5, 69.0541) (69.0541, 1.5, 11.469) (24.6202, 1.5, -4.3412) (49.2404, 1.5, -8.6824) (8.6824, 1.5, -49.2404) (4.3412, 1.5, -24.6202) (-4.0961, 1.5, -24.6622) (-24.6622, 1.5, -4.0961)
equation "\"d64\" = Almiwidth4"
equation "\"d62\" = Almiwidth1"
equation "\"d63\" = Almiwidth1"
equation "\"Almiwidth4\" = 66.5"
equation "\"Almiwidth1\" = 47"
properties part number "baseplate_R2toR6" material "アルミニウム 6061"
